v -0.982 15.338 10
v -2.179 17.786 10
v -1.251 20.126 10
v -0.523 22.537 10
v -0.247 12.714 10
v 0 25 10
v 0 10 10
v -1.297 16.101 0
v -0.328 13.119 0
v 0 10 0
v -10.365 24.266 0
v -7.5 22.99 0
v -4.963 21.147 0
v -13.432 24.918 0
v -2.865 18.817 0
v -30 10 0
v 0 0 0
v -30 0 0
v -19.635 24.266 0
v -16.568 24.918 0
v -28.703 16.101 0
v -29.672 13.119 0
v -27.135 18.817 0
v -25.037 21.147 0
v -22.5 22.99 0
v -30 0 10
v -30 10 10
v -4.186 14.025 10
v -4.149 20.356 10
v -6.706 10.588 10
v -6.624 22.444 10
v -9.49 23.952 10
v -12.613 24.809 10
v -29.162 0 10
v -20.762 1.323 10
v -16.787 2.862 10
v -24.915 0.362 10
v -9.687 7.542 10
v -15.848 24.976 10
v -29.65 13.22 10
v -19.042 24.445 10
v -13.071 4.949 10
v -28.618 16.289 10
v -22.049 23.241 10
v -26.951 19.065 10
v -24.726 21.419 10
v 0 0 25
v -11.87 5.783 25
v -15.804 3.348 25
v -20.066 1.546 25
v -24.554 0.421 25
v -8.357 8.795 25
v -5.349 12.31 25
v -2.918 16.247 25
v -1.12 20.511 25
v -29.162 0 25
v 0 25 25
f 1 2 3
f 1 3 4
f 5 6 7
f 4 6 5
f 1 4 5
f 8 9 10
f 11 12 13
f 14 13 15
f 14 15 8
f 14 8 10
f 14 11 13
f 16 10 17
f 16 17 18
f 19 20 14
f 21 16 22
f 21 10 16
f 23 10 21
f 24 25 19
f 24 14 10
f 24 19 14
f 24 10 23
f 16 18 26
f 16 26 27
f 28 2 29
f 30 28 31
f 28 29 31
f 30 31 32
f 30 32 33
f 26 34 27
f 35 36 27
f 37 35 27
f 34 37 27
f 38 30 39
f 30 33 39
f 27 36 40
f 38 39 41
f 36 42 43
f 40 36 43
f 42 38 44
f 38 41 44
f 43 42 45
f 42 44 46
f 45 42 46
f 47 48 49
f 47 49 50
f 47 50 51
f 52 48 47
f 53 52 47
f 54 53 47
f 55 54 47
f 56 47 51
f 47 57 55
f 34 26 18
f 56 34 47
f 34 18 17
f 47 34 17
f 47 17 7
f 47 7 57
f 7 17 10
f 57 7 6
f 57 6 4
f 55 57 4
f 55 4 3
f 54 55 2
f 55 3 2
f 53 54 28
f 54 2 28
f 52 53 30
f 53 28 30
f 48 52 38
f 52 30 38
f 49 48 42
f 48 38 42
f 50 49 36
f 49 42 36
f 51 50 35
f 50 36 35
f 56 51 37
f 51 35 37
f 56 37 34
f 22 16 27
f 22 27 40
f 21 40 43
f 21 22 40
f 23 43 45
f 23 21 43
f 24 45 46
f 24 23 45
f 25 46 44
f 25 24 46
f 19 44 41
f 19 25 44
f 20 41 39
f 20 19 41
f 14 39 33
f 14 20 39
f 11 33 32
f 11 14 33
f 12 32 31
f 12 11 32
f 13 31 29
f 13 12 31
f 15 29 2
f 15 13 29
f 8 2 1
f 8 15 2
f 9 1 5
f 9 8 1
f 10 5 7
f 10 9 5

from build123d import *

# Parameters (mm, degrees)
BOSS_EXTRUDE1_DEPTH = 10
BOSS_EXTRUDE3_DEPTH = 15


with BuildPart() as part:
    # Sketch1 → Boss-Extrude1 (new body)
    with BuildSketch(Plane.XY):
        with BuildLine():
            Line((-30, 0), (-30, 10))
            ThreePointArc((-30, 10), (-15, 25), (0, 10))
            Line((0, 10), (0, 0))
            Line((0, 0), (-30, 0))
        make_face()
    extrude(amount=BOSS_EXTRUDE1_DEPTH)

    # Sketch2 → Boss-Extrude3 (add)
    with BuildSketch(Plane.XY.offset(10)):
        with BuildLine():
            ThreePointArc((0, 25), (-10.055269439, 7.220988407), (-29.161787258, 0))
            Line((-29.161787258, 0), (0, 0))
            Line((0, 0), (0, 25))
        make_face()
    extrude(amount=BOSS_EXTRUDE3_DEPTH)


solid = part.part
